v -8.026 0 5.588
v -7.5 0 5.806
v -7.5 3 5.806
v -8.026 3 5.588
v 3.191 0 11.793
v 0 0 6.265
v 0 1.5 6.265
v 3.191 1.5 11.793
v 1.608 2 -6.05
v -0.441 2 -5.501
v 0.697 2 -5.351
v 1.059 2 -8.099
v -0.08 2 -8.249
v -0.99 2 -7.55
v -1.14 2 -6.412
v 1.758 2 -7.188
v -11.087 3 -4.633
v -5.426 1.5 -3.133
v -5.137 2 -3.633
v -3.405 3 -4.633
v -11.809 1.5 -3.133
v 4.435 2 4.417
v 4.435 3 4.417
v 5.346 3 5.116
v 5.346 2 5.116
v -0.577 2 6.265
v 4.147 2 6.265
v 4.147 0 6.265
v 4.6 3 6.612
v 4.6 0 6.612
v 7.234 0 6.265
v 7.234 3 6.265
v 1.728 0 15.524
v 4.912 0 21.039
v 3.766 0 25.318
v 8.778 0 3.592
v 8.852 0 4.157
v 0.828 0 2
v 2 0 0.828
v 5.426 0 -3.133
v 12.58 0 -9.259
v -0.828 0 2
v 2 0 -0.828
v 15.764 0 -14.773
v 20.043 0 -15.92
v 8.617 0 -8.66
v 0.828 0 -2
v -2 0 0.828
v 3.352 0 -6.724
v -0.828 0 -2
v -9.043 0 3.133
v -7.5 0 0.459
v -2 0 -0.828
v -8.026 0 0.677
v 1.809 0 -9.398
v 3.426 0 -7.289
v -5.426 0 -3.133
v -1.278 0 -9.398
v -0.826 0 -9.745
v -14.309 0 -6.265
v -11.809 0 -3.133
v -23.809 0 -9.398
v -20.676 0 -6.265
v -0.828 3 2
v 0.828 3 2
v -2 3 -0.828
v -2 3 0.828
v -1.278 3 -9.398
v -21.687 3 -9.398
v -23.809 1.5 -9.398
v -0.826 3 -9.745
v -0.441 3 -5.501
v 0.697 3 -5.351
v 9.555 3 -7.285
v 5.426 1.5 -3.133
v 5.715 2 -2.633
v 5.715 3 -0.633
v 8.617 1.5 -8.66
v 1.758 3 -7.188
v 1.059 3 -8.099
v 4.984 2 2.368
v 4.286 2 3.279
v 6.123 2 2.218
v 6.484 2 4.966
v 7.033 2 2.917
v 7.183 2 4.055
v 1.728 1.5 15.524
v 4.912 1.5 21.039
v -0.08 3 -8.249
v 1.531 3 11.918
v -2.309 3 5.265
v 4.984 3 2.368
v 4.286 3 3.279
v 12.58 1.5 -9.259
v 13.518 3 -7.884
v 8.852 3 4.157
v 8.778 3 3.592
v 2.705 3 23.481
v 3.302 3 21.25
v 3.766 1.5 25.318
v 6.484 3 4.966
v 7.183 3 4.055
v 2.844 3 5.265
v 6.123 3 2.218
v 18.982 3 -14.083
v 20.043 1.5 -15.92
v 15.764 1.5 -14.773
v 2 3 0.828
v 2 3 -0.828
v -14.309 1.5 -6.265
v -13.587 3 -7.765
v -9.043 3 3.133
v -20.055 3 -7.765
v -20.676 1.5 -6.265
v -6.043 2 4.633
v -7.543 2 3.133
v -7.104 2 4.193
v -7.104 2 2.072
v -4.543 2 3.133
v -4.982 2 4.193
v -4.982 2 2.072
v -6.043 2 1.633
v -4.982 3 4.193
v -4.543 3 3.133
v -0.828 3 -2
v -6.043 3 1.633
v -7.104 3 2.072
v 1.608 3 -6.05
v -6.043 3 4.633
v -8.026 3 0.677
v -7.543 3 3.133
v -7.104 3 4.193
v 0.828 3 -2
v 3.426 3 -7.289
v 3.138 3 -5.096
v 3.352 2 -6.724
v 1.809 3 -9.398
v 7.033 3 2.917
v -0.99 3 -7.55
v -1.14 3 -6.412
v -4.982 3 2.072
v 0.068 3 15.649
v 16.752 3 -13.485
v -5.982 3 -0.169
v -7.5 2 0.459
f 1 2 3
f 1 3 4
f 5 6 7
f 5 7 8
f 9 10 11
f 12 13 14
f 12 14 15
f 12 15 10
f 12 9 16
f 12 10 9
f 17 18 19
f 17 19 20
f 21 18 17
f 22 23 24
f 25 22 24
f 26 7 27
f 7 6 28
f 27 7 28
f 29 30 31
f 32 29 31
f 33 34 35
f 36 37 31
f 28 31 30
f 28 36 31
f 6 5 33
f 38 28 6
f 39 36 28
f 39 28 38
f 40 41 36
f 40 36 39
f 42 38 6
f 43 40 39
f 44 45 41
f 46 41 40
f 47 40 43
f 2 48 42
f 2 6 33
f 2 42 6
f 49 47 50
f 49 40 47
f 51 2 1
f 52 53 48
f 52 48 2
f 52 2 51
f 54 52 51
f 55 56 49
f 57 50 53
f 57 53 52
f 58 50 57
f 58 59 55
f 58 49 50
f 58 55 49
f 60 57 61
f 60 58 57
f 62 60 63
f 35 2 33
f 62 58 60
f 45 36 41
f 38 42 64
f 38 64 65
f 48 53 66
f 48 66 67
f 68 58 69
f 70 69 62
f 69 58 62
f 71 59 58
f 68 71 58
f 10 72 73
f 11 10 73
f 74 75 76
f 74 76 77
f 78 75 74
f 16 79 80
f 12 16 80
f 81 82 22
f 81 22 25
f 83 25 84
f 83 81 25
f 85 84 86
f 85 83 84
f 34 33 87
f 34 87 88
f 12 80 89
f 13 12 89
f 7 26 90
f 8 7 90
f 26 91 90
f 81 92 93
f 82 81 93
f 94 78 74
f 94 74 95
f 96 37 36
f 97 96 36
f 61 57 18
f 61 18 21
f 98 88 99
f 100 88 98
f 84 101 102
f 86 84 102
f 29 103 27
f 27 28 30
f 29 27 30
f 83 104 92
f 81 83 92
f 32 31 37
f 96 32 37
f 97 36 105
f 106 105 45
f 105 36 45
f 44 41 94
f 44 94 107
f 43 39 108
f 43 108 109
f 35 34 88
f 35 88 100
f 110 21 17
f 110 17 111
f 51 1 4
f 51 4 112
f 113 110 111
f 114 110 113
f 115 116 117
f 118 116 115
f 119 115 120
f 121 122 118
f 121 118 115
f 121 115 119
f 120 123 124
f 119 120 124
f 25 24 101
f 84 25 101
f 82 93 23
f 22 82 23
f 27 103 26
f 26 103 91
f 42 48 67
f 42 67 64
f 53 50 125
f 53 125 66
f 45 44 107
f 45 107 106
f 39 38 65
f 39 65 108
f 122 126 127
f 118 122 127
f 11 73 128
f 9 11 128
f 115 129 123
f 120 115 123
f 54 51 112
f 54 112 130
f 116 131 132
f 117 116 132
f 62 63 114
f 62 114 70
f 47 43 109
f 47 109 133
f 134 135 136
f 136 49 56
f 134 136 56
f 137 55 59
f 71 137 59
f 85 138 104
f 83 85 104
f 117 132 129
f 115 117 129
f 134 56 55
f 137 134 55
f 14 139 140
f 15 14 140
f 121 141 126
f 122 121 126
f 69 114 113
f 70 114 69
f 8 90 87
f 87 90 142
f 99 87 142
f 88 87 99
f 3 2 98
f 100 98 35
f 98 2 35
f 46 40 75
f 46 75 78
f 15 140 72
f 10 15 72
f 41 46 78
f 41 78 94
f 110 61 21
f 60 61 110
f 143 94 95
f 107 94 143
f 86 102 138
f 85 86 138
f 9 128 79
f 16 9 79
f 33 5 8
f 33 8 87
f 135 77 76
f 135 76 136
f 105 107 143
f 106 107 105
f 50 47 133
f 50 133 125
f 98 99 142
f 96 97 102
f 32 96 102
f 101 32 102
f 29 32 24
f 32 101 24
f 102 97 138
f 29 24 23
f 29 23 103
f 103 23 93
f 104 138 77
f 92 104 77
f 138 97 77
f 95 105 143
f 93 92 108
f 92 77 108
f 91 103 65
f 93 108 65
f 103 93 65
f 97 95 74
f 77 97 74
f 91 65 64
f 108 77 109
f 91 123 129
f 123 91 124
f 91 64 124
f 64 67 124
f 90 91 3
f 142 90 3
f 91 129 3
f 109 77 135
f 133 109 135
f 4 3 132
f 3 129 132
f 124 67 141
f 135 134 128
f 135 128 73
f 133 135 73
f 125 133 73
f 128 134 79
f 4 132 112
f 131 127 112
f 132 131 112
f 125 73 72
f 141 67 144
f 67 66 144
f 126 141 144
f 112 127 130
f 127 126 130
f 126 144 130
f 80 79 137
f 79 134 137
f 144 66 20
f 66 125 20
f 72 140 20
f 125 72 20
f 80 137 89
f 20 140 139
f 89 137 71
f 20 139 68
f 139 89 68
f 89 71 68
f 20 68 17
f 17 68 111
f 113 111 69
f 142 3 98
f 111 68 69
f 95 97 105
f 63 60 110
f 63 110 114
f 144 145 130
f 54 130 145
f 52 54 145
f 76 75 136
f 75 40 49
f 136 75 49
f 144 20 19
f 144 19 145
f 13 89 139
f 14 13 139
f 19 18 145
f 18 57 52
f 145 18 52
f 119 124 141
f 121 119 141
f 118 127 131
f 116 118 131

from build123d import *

# Parameters (mm, degrees)
BOSS_EXTRUDE2_DEPTH = 3
BOSS_EXTRUDE3_DEPTH = 3
CHAMFER1_SIZE       = 1.5
BOSS_EXTRUDE4_DEPTH = 3
CUT_EXTRUDE1_DEPTH  = 1
CHAMFER2_SIZE       = 1


with BuildPart() as part:
    # Sketch1 → Boss-Extrude2 (new body)
    with BuildSketch(Plane(origin=(0, 0, 0), x_dir=(1, 0, 0), z_dir=(0, 1, 0))):
        Polygon((-3.617228643129947, -6.5e-16), (-1.8086143215649655, -3.132611896247254), (1.8086143215649881, -3.132611896247241), (3.6172286431299465, 2.591e-14), (1.8086143215649435, 3.132611896247266), (-1.8086143215650103, 3.1326118962472274), align=None)
        Polygon((1.9999999999999936, 0.8284271247461886), (0.8284271247461865, 1.999999999999994), (-0.8284271247461888, 1.9999999999999927), (-1.9999999999999936, 0.8284271247461867), (-1.9999999999999922, -0.8284271247461881), (-0.8284271247461862, -1.9999999999999931), (0.8284271247461892, -1.9999999999999918), (1.999999999999994, -0.8284271247461859), align=None, mode=Mode.SUBTRACT)
    extrude(amount=BOSS_EXTRUDE2_DEPTH)

    # Sketch3 → Boss-Extrude3 (add)
    with BuildSketch(Plane(origin=(0, 0, 0), x_dir=(1, 0, 0), z_dir=(0, 1, 0))):
        Polygon((1.35009e-12, -6.265223792495006), (3.191385678434759, -11.792865934089827), (1.7284641960877252, -15.524235391675447), (4.912158247964482, -21.038555245281238), (3.7655427137404005, -25.31778267575289), (0.2655427137398905, -19.25560484926116), (-7.234457286261282, -6.2652237924924865), (-9.043071607825457, -3.132611896246603), (-7.234457286259898, 1.64471e-12), (-5.425842964695981, 3.1326118962470666), (-11.808614321563178, 3.132611896247083), (-14.30861432156403, 6.265223792494697), (-20.676002425317918, 6.265223792494897), (-23.80861432156554, 9.397835688742644), (-16.808614321564708, 9.397835688742767), (-1.8086143215623112, 9.397835688742738), (1.8086143215660542, 9.397835688742727), (3.6172286431313894, 6.265223792494598), (5.4258429646954855, 3.132611896248873), (8.617228643129225, 8.660254037843819), (12.58015012547734, 9.259011599181736), (15.763844177354214, 14.77333145278746), (20.043071607826096, 15.919946987011269), (16.54307160782585, 9.857769160519384), (9.04307160782462, -3.1326118962492617), (7.234457286260429, -6.265223792495135), (3.6172286431296587, -6.265223792494937), align=None)
        Polygon((-1.8086143215639572, -3.132611896247045), (-3.617228643129372, 9.8462e-13), (-1.808614321565077, 3.1326118962470595), (1.8086143215657584, 3.1326118962474574), (3.6172286431299985, 1.0129e-12), (1.8086143215649881, -3.132611896247241), align=None, mode=Mode.SUBTRACT)
    extrude(amount=BOSS_EXTRUDE3_DEPTH)

    # Chamfer1
    chamfer1_edges = [part.edges().sort_by_distance(p)[0] for p in [
        (17.903457892590154, 3, -15.346639219899364),
        (14.171997151415777, 3, -12.016171525984598),
        (10.598689384303283, 3, -8.959632818512777),
        (7.021535803912355, 3, -5.896432967046346),
        (-22.24230837344173, 3, -7.8315297406187705),
        (-17.492308373440974, 3, -6.2652237924947976),
        (-13.058614321563603, 3, -4.69891784437089),
        (-8.617228643129579, 3, -3.1326118962470746),
        (4.338850480852441, 3, 23.178168960517063),
        (3.3203112220261035, 3, 18.281395318478342),
        (2.459924937261242, 3, 13.658550662882636),
        (1.5956928392180545, 3, 9.029044863292416),
    ]]
    chamfer(chamfer1_edges, length=CHAMFER1_SIZE)

    # Sketch4 → Boss-Extrude4 (add)
    with BuildSketch(Plane(origin=(0, 0, 0), x_dir=(1, 0, 0), z_dir=(0, 1, 0))):
        Polygon((-6.798376917342761, -0.16876811390146088), (-6.798376917342759, -6.096455678591746), (-8.026041208745289, -5.587940479051664), (-9.043071607825457, -3.132611896246603), (-8.026041208745289, -0.6772833134415445), align=None)
        Polygon((3.4264760493730018, 7.289397235314943), (1.8086143215658708, 9.39783568874193), (-0.8262778053214378, 9.744725818120022), (-1.8804970320349317, 8.935794954216455), (3.2530309846839565, 5.97195117187129), align=None)
        Polygon((4.59956515937226, -6.612113921873456), (7.23445728625957, -6.2652237924954015), (8.852319014066733, -4.156785339068437), (8.678873949377703, -2.8393392756247793), (3.545345932658778, -5.803183057969877), align=None)
    extrude(amount=BOSS_EXTRUDE4_DEPTH)

    # Sketch6 → Cut-Extrude1 (cut)
    with BuildSketch(Plane(origin=(0, 3, 0), x_dir=(1, 0, 0), z_dir=(0, 1, 0))):
        Polygon((1.058614321565864, 8.098797583065272), (-0.07961424608791523, 8.248648216822222), (-0.9904237841107939, 7.549759477388622), (-1.1402744178677426, 6.411530909734845), (-0.4413856784341425, 5.500721371711964), (0.6968428892196359, 5.350870737955016), (1.6076524272425143, 6.049759477388614), (1.757503060999463, 7.187988045042393), align=None)
        Polygon((-7.543071607825456, -3.1326118962466047), (-7.103731779605277, -4.193272068026425), (-6.043071607825456, -4.632611896246601), (-4.982411436045638, -4.193272068026424), (-4.5430716078254605, -3.1326118962466007), (-4.982411436045639, -2.071951724466782), (-6.043071607825459, -1.6326118962466047), (-7.103731779605278, -2.0719517244667833), align=None)
        Polygon((6.484457286259583, -4.966185686818733), (7.183346025693192, -4.0553761487958635), (7.033495391936258, -2.9171475811420824), (6.122685853913389, -2.218258841708473), (4.984457286259606, -2.368109475465409), (4.2855685468259965, -3.2789190134882777), (4.435419180582931, -4.417147581142059), (5.346228718605801, -5.116036320575668), align=None)
    extrude(amount=-CUT_EXTRUDE1_DEPTH, mode=Mode.SUBTRACT)

    # Chamfer2
    chamfer2_edges = [part.edges().sort_by_distance(p)[0] for p in [
        (1.2077191668051772, 3, 6.265223792494805),
        (4.821983381293134, 3, -4.1785273753389465),
        (-6.029702548098242, 3, -2.0866964171569644),
    ]]
    chamfer(chamfer2_edges, length=CHAMFER2_SIZE)


solid = part.part
